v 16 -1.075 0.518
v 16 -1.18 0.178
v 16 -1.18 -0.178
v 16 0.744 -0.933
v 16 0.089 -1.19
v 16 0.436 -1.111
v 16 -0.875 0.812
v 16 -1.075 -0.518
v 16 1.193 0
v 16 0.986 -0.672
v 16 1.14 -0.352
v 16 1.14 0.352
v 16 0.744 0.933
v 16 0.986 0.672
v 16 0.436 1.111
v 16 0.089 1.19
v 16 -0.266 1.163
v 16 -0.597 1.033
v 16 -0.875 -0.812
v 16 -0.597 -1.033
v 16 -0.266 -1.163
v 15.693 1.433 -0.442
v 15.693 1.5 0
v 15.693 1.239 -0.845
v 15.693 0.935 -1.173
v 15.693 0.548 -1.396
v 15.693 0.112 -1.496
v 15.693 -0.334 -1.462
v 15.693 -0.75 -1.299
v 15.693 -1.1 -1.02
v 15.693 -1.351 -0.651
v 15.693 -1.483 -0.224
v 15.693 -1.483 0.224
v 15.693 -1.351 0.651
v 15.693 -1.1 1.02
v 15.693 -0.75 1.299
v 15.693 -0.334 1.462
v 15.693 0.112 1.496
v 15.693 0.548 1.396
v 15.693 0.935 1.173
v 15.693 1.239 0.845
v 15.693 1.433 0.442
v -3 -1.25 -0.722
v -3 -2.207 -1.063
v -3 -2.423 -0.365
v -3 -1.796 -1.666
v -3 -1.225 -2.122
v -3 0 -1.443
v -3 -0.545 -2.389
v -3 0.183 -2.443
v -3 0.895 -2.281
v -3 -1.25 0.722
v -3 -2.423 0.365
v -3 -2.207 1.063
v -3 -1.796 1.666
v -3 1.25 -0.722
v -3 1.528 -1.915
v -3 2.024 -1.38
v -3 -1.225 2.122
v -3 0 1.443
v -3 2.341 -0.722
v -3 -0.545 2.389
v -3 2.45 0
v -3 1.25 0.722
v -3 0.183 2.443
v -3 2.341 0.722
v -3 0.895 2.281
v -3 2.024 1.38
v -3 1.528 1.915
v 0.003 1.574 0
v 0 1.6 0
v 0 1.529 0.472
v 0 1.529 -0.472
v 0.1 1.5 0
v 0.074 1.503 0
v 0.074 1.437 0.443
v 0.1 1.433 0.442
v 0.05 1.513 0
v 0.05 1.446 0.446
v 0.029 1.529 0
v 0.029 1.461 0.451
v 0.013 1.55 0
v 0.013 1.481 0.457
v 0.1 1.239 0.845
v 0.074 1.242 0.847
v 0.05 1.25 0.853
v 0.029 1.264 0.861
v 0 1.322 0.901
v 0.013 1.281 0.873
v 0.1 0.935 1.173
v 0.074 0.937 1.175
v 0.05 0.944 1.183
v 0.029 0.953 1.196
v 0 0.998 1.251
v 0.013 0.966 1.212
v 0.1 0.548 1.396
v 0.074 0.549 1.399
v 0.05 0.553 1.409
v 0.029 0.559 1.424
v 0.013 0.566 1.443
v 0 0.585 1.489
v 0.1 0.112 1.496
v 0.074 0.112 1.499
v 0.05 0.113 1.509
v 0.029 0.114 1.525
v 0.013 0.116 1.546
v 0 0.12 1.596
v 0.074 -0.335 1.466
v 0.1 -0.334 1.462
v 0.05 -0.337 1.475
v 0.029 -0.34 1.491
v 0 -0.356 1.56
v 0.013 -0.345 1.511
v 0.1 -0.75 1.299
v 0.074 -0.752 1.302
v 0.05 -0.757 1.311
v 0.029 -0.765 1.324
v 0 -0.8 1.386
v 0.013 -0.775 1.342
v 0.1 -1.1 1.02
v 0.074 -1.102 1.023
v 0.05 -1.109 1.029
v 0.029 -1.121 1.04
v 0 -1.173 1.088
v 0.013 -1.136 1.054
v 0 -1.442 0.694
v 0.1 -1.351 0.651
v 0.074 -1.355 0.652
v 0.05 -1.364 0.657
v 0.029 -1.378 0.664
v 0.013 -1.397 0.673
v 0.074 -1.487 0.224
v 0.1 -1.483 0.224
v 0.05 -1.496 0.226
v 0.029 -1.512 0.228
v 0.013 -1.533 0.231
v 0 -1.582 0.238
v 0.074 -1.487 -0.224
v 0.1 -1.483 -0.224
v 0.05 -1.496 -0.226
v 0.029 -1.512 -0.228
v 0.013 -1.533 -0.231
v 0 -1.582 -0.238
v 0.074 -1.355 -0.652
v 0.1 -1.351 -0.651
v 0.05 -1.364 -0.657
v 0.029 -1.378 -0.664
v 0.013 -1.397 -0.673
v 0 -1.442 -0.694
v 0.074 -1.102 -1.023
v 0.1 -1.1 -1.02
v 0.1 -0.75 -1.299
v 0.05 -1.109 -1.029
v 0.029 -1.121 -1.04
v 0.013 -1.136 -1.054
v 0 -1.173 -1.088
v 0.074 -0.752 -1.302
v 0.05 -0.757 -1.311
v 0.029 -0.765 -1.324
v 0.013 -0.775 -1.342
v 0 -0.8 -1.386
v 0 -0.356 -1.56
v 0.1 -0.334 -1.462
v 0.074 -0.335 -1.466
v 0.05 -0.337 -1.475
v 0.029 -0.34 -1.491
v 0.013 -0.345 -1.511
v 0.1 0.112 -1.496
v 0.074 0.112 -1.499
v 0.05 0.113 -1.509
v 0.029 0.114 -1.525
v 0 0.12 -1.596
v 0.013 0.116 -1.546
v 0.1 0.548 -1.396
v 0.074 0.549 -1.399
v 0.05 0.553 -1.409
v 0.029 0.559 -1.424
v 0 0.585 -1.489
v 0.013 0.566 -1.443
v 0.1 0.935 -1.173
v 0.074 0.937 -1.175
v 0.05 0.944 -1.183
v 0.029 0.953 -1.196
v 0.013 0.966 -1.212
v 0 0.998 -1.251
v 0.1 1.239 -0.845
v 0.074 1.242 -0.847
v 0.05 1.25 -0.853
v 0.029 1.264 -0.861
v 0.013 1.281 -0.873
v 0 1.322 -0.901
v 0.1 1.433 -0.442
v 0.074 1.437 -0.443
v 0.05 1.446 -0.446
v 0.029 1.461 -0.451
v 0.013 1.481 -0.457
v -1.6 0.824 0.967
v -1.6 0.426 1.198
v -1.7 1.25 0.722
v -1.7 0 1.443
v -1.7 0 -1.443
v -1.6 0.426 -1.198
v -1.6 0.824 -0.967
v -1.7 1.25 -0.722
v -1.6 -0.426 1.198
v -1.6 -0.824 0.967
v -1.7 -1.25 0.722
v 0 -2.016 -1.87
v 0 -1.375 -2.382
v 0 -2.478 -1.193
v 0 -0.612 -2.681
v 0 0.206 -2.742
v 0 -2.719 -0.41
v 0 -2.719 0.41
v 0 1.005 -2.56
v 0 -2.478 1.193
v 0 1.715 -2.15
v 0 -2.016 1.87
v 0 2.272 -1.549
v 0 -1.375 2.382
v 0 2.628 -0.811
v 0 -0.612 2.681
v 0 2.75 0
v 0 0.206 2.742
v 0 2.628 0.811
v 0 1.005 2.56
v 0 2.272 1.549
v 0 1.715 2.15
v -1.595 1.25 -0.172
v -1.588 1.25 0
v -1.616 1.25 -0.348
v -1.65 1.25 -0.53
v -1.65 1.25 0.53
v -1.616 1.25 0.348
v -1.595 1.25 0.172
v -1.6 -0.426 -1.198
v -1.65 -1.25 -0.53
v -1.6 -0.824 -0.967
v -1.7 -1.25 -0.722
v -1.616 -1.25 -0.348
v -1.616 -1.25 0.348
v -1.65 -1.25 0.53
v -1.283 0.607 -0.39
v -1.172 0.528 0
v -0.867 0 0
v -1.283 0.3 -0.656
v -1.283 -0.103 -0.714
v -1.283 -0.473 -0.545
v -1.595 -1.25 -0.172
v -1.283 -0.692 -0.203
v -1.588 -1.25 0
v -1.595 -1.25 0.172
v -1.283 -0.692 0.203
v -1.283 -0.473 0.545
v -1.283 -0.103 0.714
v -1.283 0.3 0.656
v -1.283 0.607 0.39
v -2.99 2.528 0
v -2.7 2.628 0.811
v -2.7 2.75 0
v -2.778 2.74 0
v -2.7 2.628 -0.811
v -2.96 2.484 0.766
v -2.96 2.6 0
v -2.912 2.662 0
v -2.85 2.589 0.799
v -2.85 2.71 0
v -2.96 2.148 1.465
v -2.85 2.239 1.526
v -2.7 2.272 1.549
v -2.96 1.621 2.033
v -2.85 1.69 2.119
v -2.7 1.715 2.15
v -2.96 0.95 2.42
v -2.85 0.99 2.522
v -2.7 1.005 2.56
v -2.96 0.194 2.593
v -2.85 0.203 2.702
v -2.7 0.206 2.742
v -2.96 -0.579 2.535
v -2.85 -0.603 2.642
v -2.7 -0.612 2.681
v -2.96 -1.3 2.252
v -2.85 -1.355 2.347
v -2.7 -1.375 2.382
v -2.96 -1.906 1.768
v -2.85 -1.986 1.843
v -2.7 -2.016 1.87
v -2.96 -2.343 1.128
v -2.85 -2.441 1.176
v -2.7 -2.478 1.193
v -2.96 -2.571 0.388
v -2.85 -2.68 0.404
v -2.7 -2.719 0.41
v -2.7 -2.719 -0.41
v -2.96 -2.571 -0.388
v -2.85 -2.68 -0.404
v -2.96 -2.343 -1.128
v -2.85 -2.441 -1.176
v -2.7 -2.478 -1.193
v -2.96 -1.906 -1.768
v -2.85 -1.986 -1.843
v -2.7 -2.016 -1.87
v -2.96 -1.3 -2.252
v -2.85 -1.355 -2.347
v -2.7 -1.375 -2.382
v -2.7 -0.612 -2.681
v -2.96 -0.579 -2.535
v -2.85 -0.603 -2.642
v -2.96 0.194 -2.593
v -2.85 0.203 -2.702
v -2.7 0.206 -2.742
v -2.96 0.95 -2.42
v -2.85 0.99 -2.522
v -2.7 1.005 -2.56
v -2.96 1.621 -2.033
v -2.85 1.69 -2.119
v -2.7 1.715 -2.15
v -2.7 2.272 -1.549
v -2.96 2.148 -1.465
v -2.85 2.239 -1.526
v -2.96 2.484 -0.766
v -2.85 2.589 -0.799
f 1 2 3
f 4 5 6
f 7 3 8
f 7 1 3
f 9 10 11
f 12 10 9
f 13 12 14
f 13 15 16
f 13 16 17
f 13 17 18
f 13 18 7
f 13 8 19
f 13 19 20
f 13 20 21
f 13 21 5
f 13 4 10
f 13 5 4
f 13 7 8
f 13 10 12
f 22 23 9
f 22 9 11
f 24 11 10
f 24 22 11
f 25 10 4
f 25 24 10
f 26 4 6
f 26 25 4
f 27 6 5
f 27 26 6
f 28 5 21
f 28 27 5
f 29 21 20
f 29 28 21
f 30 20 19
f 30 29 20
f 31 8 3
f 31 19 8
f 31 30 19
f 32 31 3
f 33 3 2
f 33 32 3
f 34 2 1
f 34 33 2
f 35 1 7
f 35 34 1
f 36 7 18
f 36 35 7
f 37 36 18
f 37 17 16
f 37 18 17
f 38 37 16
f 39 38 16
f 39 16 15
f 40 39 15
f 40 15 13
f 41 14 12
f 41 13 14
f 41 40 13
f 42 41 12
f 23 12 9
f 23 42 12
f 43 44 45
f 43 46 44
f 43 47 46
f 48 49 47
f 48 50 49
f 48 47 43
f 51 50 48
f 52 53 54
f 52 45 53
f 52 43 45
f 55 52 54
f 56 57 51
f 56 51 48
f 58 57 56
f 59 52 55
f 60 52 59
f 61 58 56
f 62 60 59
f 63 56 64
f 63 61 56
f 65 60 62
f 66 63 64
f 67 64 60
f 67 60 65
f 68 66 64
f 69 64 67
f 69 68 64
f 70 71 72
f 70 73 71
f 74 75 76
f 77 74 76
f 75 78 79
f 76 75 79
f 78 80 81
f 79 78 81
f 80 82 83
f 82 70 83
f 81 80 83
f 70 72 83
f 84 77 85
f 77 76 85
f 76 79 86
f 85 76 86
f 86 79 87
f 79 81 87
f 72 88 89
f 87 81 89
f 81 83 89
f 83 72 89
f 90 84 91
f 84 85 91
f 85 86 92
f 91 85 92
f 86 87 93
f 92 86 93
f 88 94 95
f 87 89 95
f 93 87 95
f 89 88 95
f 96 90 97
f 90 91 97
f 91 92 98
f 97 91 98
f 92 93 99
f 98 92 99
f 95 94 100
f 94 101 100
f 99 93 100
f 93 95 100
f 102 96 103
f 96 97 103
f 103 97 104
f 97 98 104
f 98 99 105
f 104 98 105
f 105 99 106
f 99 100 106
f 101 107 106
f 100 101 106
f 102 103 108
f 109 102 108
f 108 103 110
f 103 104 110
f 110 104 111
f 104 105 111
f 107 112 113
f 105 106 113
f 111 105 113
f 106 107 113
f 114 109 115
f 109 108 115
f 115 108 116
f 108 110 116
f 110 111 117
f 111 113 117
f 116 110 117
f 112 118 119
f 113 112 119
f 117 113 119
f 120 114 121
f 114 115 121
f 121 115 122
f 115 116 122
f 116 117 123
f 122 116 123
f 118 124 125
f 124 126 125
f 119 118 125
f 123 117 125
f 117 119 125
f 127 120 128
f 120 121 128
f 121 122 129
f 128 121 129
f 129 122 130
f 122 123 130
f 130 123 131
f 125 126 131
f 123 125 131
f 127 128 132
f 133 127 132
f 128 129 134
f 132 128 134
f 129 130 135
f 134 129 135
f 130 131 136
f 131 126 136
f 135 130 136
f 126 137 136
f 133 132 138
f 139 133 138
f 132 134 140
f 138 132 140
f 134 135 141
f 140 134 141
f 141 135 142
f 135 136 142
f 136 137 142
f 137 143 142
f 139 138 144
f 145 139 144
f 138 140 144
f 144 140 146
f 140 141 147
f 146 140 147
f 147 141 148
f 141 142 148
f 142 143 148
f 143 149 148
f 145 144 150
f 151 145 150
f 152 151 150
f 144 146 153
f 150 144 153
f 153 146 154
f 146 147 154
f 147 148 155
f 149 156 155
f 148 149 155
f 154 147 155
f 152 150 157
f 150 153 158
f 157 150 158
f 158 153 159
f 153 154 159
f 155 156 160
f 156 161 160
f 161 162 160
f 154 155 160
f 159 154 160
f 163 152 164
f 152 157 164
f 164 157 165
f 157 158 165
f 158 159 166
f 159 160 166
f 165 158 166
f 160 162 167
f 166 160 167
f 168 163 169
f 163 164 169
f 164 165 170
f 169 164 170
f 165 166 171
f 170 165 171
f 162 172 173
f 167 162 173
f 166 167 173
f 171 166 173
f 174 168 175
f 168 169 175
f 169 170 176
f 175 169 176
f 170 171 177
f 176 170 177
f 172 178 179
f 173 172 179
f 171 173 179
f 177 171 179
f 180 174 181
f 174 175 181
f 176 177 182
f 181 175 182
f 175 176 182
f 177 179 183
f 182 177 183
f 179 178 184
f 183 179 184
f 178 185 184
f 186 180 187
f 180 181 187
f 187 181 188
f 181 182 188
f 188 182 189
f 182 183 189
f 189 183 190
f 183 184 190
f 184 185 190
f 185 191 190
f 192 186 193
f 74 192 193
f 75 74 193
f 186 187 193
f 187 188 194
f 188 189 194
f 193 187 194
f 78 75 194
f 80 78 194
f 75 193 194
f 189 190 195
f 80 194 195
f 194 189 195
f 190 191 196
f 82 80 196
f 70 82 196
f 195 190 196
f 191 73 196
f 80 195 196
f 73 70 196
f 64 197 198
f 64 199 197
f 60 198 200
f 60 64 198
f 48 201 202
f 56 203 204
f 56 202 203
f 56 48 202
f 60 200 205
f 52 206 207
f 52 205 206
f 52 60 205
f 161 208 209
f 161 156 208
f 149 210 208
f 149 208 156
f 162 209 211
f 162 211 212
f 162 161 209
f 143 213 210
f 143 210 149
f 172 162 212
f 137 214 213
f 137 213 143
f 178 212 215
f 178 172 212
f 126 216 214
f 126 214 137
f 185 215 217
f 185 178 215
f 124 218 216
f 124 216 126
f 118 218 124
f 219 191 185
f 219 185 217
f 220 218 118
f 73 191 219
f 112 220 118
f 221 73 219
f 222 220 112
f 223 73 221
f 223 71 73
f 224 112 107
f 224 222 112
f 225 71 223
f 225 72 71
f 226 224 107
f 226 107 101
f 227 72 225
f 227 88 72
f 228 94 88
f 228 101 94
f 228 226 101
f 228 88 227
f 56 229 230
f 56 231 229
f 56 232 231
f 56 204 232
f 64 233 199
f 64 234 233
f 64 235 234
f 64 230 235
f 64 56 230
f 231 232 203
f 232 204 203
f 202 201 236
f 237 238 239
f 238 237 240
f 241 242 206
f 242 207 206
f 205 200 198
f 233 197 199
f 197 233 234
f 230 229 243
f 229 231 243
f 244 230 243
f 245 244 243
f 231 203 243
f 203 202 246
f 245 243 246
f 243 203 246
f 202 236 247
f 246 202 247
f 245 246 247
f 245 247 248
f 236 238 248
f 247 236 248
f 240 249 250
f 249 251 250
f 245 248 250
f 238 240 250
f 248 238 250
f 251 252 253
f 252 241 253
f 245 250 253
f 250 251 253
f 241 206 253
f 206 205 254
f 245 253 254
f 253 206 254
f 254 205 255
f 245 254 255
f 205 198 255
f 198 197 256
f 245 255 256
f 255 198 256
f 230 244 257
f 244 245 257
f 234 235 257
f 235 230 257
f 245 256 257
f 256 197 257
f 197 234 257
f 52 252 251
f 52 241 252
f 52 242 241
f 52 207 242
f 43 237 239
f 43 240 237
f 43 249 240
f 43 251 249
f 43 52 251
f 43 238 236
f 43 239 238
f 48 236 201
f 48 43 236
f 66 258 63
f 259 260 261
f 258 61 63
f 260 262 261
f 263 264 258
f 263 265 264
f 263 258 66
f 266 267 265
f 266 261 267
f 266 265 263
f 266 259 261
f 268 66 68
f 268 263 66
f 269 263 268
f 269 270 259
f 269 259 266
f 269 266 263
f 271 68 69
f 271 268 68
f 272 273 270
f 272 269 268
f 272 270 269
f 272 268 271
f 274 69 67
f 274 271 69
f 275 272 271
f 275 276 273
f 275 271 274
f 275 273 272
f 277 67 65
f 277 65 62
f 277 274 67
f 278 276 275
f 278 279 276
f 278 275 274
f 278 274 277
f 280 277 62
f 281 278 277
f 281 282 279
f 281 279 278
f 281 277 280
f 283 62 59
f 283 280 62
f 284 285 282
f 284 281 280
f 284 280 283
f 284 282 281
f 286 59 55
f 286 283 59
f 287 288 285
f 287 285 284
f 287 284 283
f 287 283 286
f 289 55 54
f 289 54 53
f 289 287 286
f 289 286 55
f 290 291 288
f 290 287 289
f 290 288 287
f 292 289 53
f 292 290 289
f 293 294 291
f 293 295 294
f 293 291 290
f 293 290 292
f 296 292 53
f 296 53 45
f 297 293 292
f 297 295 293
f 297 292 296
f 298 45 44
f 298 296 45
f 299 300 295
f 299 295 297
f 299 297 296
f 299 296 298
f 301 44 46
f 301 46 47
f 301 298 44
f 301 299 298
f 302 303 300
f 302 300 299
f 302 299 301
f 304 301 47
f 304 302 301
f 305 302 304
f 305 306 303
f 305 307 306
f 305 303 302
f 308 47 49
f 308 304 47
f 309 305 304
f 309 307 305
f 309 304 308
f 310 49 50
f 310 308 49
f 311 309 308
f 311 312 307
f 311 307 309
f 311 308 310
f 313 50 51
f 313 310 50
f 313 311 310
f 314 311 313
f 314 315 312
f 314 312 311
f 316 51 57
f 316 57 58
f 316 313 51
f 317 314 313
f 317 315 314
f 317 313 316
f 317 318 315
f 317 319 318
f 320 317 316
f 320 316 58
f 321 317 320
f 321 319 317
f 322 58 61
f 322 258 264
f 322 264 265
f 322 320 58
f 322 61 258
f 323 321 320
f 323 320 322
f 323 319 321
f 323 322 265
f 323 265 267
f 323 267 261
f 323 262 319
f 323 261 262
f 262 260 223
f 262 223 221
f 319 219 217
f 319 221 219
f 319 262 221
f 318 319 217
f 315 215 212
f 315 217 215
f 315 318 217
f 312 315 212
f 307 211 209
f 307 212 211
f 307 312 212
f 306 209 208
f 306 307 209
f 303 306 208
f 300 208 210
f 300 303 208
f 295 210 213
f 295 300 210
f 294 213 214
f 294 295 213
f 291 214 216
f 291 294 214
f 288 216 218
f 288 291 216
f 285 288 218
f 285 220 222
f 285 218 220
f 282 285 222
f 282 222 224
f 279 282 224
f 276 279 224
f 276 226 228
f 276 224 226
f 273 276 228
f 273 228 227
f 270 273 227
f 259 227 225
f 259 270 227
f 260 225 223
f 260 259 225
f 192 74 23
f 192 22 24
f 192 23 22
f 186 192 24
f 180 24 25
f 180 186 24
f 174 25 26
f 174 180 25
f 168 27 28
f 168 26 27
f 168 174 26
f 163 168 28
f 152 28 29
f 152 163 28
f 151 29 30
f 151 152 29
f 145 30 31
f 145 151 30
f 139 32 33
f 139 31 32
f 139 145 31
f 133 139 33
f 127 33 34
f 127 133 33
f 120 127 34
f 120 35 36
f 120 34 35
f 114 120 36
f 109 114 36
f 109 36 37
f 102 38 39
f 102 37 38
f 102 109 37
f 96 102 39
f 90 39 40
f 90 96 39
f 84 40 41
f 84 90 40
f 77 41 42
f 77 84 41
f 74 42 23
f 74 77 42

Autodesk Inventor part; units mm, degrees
ref_plane "YZ Plane" through (0, 0, 0) normal (1, 0, 0) x (0, 1, 0)
ref_plane "XZ Plane" through (0, 0, 0) normal (0, 1, 0) x (-1, 0, 0)
sketch "Sketch1" plane through (0, 0, 0) normal (0, 0, 1) x (1, 0, 0)
  line L0 (-0.8667, 0) -> (16, 0)
  line L1 (16, 0) -> (16, 1.5)
  line L2 (16, 1.5) -> (12.25, 1.5)
  line L3 (12.25, 1.5) -> (11.9432, 1.5)
  line L4 (11.9432, 1.5) -> (0, 1.5)
  line L5 (0, 1.5) -> (0, 2.75)
  line L6 (0, 2.75) -> (-3, 2.75)
  line L7 (-3, 2.75) -> (-3, 1.4434)
  line L8 (-3, 1.4434) -> (-1.7, 1.4434)
  line L9 (-1.7, 1.4434) -> (-0.8667, 0)
  line L10 (-6.8, 0) -> (19.8, 0) projected
  line L11 (0, -0.55) -> (0, 3.3) projected
  line L12 (12.25, 1.5) -> (0, 1.5) construction
  dimension "d1" = 3.75
  dimension "d2" = 0.3068
  dimension "d3" = 3
  dimension "d4" = 1.3
  dimension "d5" = 60
  dimension "d6" = 3
  dimension "d7" = 3
  dimension "d8" = 2.8868
  dimension "d9" = 5.5
  dimension "d26" = 16
revolve "Body" add sketch "Sketch1" angle 360 about axis through (-0.8667, 0, 0) along (1, 0, 0)
sketch "Sketch2" plane through (-3, 0, 0) normal (-1, 0, 0) x (0, 0, 1)
  circle A0 centre (0, 0) radius 1.4434 projected
  line L0 (0, -3.85) -> (0, 3.85) projected
  line L1 (-3.85, 0) -> (3.85, 0) projected
  line L2 (1.4434, 0) -> (0.7217, -1.25)
  line L3 (0.7217, -1.25) -> (-0.7217, -1.25)
  line L4 (-0.7217, -1.25) -> (-1.4434, 0)
  line L5 (-1.4434, 0) -> (-0.7217, 1.25)
  line L6 (-0.7217, 1.25) -> (0.7217, 1.25)
  line L7 (0.7217, 1.25) -> (1.4434, 0)
  point P0 (0, 0)
extrude "Slot" add sketch "Sketch2" against normal up to next contours L7 A0 | A0 L2 | L6 L0 A0 | A0 L0 L3 | L0 L6 A0 | A0 L3 L0 | L4 A0 | A0 L5
fillet "Fillet1" radius 0.3 1 edges at (-3, -2.75, 0)
thread "Thread" size "M3x0.5" class "6g" standard "ISO Metric profile" length 14.75
chamfer "Chamfer1" distance 0.3067 distance2 0.3067 1 edges at (16, -1.5, 0) measured on face at (16, -0.4645, -0.4115)
ref_plane "Work Plane1" through (29, 0, 0) normal (0, -1, 0) x (1, 0, 0)
fillet "Fillet2" radius 0.1 1 edges at (0, -1.5, 0)
equation "\"d1\" = GEL"
equation "\"d3\" = KOH"
equation "\"d4\" = INTI"
equation "\"d6\" = GD"
equation "\"d7\" = BDM"
equation "\"d8\" = 1.1547 * SW"
equation "\"d9\" = KOD"
equation "\"d30\" = R"
equation "\"d17\" = RR"
equation "\"d15\" = -0.5 * SPD + 0.5 * GD"
equation "\"d16\" = GUL"
equation "\"GD\" = 3"
equation "\"NLG\" = 5"
equation "\"GEL\" = 3.75"
equation "\"KOD\" = 5.5"
equation "\"KOH\" = 3"
equation "\"INTI\" = 1.3"
equation "\"GAL\" = 0.61345 * PTC"
equation "\"GUL\" = 0.61345 * PTC"
equation "\"BDM\" = NND"
equation "\"SW\" = 2.5"
equation "\"RR\" = 0.3"
equation "\"SPD\" = NND - 1.2269 * PTC"
equation "\"R\" = 0.1"
equation "\"TOA\" = 30deg"
equation "\"GD1\" = THREADDIA - 1.2269 * PTC"
equation "\"THREADDIA\" = 3"
equation "\"FAWI\" = 45deg"
equation "\"PTC\" = 0.5"
equation "\"NND\" = 3"
equation "\"E0\" = 1.155 * SW"
properties part number "Allen Key 3x16mm" material "Stainless Steel, 440C"
